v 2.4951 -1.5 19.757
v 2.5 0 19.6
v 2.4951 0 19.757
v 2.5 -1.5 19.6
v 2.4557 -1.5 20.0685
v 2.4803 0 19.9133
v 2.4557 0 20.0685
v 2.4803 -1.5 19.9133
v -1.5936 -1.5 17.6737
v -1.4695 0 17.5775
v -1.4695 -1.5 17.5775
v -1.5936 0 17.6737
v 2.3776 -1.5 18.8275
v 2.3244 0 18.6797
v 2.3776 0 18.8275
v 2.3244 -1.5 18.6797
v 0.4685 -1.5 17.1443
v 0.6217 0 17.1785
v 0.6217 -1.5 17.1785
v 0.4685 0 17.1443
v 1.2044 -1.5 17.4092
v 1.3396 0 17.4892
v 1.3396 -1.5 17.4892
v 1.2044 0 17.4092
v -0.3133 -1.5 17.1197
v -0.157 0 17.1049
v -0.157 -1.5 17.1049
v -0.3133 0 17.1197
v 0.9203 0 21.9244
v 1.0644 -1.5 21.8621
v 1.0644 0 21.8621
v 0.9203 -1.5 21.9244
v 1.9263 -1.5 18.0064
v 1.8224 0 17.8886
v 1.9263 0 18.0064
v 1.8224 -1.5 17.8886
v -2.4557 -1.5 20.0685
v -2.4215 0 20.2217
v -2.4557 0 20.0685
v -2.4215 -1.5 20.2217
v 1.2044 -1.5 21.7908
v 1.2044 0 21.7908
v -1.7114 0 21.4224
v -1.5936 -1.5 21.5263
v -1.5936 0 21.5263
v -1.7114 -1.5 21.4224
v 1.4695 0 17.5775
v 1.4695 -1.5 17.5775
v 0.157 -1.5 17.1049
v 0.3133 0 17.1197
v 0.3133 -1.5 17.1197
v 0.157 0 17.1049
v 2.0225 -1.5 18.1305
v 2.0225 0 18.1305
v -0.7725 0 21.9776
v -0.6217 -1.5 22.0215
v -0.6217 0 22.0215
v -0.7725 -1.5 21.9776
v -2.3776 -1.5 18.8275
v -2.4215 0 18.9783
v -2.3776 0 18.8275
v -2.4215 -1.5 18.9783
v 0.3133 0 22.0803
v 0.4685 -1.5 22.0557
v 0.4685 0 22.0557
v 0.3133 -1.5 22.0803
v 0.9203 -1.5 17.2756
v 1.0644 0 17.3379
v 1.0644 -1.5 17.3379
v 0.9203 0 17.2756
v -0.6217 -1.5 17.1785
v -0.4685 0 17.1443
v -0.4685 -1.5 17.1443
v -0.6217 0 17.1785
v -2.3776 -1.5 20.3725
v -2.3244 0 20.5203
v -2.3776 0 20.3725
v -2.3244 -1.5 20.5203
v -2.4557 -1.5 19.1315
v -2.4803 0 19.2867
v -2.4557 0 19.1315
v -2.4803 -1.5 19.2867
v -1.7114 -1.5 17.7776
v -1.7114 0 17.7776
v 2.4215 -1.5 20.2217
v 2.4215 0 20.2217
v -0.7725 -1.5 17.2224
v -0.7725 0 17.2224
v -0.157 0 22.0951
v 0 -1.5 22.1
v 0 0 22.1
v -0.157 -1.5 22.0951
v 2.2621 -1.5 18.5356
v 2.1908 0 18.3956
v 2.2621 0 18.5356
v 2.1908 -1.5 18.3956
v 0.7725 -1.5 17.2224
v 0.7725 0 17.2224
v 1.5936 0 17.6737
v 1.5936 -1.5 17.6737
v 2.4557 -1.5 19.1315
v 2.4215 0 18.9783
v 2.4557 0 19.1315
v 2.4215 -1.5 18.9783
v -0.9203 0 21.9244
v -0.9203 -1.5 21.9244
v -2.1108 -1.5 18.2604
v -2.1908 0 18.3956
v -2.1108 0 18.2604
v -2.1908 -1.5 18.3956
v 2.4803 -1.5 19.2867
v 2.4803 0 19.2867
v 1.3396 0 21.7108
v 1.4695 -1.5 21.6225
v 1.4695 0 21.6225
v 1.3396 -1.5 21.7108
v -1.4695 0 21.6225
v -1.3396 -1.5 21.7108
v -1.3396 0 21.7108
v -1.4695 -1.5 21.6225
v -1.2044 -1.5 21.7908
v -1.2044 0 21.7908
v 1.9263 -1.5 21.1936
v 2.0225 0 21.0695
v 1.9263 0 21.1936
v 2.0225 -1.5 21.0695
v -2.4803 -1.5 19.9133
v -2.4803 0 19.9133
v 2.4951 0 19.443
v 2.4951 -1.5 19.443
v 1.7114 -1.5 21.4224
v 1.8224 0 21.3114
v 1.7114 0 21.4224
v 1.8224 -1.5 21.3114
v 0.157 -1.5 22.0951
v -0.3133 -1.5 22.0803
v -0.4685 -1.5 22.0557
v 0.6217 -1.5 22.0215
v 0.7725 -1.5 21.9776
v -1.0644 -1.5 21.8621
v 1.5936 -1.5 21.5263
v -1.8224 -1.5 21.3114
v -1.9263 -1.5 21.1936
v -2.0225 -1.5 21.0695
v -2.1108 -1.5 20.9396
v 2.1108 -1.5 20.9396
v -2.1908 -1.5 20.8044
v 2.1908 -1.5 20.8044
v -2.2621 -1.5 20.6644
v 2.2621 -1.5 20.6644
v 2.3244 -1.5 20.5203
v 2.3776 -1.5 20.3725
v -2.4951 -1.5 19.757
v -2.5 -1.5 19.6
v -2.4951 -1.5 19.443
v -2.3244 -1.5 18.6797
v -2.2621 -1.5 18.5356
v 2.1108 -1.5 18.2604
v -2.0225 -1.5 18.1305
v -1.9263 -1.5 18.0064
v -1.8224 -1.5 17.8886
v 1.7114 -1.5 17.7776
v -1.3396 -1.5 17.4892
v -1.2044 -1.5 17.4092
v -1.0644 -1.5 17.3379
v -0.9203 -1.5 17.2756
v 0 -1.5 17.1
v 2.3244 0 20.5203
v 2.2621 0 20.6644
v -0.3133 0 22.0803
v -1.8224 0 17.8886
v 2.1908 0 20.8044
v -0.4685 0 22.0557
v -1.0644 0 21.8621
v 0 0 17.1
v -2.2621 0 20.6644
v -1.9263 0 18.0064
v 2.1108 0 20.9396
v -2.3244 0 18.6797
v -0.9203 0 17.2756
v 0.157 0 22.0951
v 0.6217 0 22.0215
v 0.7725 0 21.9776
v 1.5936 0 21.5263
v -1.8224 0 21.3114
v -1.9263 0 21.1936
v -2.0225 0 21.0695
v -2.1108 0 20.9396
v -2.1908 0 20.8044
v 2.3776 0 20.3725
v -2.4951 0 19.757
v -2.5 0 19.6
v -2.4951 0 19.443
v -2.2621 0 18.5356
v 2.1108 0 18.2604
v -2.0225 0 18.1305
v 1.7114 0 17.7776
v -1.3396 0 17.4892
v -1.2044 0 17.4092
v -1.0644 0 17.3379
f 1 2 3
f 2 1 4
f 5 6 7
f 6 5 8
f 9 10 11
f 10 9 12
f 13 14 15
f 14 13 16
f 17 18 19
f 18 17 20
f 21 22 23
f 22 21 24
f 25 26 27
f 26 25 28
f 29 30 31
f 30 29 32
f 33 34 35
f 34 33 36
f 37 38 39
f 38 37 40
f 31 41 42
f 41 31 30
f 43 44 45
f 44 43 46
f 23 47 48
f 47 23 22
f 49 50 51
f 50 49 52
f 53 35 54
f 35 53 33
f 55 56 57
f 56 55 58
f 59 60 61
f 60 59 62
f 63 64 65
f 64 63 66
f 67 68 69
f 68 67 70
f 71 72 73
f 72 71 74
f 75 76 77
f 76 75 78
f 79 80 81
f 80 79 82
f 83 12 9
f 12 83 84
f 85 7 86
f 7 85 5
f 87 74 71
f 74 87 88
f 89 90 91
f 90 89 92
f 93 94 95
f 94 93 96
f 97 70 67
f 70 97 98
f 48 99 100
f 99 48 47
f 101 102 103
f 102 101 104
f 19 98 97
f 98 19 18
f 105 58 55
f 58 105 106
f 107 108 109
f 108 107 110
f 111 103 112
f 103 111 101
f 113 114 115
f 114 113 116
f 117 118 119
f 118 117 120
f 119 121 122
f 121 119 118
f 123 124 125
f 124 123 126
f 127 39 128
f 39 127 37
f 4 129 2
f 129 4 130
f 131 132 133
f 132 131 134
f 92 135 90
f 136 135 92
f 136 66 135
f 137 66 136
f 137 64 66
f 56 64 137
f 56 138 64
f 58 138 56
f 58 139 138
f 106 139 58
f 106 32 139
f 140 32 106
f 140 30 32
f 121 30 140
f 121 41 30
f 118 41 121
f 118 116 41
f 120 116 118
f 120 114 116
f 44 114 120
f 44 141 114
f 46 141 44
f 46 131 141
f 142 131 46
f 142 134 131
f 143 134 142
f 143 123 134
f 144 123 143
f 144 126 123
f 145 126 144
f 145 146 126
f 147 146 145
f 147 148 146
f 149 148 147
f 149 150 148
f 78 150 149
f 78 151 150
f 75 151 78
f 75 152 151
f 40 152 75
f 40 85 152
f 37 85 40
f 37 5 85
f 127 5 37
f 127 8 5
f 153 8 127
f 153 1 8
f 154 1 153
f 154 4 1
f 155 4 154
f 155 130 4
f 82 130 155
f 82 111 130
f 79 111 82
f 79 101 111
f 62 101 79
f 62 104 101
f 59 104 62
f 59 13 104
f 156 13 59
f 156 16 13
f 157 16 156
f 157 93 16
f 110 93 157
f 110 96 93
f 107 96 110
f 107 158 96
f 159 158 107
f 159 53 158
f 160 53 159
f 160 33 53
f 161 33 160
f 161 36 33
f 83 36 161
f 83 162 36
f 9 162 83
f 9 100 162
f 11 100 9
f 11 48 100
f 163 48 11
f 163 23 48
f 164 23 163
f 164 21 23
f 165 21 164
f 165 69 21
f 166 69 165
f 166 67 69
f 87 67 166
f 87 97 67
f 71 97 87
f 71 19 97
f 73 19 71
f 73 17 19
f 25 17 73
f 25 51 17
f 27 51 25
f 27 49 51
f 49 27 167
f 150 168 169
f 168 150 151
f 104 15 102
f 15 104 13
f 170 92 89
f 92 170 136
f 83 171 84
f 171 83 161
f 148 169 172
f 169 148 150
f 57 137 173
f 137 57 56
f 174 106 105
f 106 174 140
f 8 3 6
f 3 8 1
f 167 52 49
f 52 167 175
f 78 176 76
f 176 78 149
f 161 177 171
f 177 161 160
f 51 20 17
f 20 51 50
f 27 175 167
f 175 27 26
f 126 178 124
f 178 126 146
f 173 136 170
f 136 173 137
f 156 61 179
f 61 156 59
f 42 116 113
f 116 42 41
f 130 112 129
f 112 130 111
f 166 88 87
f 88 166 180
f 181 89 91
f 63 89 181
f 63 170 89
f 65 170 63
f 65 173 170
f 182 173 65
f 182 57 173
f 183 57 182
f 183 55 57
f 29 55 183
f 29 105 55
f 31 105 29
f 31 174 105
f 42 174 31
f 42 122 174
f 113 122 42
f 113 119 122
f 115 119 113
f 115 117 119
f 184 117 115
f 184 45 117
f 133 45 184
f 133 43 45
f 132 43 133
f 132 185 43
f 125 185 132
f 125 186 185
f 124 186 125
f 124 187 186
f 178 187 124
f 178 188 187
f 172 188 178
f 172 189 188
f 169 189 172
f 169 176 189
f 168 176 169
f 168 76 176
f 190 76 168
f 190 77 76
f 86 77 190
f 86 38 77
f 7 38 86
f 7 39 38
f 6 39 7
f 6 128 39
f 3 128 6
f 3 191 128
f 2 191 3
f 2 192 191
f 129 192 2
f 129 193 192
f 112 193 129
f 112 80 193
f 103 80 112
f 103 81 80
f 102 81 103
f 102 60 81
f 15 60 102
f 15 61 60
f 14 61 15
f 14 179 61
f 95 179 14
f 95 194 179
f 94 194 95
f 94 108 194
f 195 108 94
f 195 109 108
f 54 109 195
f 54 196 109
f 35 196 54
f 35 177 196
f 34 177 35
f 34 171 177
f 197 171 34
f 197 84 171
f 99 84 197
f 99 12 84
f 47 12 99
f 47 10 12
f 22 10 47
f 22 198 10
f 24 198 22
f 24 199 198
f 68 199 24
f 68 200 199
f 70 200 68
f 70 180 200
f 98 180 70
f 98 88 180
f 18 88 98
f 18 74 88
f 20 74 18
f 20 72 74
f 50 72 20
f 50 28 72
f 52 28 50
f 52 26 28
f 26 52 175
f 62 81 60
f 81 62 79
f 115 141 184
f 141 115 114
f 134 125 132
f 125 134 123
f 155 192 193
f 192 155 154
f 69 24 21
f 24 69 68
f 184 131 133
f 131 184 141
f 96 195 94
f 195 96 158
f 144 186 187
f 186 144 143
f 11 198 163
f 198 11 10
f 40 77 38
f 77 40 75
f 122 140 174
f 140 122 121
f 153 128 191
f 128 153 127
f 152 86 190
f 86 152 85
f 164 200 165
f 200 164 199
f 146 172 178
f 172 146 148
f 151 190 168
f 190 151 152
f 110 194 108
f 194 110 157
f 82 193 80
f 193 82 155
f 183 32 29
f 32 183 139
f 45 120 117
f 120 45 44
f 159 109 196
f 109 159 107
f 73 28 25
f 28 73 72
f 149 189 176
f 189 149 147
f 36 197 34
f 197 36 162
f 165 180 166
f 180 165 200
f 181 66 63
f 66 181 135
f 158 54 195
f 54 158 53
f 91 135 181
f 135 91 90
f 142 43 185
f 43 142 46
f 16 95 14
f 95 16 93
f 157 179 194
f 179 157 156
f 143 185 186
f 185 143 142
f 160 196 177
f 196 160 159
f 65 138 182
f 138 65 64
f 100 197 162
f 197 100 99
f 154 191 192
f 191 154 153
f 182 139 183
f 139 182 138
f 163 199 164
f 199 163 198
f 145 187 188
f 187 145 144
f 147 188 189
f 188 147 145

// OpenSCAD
/*
 * Getting started...
 */
echo(version=version());
 
if (false) {
	 polyhedron (
		 points=[ [10,10,0],[10,-10,0],[-10,-10,0],[-10,10,0], // the four points at base
							 [0,0,10]  ],                                 // the apex point 
		faces=[ [0,1,4],[1,2,4],[2,3,4],[3,0,4],              // each triangle side
								[1,0,3],[2,1,3] ]                         // two triangles for square base
	 );
}
 
module axis(thickness, height, diam) {
	translate([0, -thickness / 2, height - 0.3]) {
		rotate([90, 0, 0]) {
			cylinder(h=thickness, d1=diam, d2=diam, center=true, $fn=100);
		}
	}
}

module oneSide(thickness, baseLen, height, topWidth) { 
	points = [
		[-baseLen / 2, 0, 0],           
		[baseLen / 2, 0, 0],
		[topWidth / 2, 0, height],
		[-topWidth / 2, 0, height],
	
		[-baseLen / 2, -thickness, 0],
		[baseLen / 2, -thickness, 0],
		[topWidth / 2, -thickness, height],	
		[- topWidth / 2, -thickness, height]	
	];
	
	faces = [
		[0, 3, 2, 1], // Left
		[4, 7, 6, 5], // right
		[5, 4, 0, 1], // Base
		[4, 7, 3, 0], // Front slope
		[1, 2, 6, 5]/*, // Back slope
		[7, 6, 2, 3] */// Top
	];
	
	union() {
		polyhedron(points=points, faces=faces, convexity = 1);
		// Rounded top
		axis(thickness, height - 0.1, topWidth);
	}
}

thickness = 1.5;
baseLen = 15;
height = 20;
topWidth = 5;
axisDiam = 3;
	
color("yellow") {
	difference() {
		oneSide(thickness, baseLen, height, topWidth);
		//axis(thickness * 2.5, height - 0.1, axisDiam);
	}
}
